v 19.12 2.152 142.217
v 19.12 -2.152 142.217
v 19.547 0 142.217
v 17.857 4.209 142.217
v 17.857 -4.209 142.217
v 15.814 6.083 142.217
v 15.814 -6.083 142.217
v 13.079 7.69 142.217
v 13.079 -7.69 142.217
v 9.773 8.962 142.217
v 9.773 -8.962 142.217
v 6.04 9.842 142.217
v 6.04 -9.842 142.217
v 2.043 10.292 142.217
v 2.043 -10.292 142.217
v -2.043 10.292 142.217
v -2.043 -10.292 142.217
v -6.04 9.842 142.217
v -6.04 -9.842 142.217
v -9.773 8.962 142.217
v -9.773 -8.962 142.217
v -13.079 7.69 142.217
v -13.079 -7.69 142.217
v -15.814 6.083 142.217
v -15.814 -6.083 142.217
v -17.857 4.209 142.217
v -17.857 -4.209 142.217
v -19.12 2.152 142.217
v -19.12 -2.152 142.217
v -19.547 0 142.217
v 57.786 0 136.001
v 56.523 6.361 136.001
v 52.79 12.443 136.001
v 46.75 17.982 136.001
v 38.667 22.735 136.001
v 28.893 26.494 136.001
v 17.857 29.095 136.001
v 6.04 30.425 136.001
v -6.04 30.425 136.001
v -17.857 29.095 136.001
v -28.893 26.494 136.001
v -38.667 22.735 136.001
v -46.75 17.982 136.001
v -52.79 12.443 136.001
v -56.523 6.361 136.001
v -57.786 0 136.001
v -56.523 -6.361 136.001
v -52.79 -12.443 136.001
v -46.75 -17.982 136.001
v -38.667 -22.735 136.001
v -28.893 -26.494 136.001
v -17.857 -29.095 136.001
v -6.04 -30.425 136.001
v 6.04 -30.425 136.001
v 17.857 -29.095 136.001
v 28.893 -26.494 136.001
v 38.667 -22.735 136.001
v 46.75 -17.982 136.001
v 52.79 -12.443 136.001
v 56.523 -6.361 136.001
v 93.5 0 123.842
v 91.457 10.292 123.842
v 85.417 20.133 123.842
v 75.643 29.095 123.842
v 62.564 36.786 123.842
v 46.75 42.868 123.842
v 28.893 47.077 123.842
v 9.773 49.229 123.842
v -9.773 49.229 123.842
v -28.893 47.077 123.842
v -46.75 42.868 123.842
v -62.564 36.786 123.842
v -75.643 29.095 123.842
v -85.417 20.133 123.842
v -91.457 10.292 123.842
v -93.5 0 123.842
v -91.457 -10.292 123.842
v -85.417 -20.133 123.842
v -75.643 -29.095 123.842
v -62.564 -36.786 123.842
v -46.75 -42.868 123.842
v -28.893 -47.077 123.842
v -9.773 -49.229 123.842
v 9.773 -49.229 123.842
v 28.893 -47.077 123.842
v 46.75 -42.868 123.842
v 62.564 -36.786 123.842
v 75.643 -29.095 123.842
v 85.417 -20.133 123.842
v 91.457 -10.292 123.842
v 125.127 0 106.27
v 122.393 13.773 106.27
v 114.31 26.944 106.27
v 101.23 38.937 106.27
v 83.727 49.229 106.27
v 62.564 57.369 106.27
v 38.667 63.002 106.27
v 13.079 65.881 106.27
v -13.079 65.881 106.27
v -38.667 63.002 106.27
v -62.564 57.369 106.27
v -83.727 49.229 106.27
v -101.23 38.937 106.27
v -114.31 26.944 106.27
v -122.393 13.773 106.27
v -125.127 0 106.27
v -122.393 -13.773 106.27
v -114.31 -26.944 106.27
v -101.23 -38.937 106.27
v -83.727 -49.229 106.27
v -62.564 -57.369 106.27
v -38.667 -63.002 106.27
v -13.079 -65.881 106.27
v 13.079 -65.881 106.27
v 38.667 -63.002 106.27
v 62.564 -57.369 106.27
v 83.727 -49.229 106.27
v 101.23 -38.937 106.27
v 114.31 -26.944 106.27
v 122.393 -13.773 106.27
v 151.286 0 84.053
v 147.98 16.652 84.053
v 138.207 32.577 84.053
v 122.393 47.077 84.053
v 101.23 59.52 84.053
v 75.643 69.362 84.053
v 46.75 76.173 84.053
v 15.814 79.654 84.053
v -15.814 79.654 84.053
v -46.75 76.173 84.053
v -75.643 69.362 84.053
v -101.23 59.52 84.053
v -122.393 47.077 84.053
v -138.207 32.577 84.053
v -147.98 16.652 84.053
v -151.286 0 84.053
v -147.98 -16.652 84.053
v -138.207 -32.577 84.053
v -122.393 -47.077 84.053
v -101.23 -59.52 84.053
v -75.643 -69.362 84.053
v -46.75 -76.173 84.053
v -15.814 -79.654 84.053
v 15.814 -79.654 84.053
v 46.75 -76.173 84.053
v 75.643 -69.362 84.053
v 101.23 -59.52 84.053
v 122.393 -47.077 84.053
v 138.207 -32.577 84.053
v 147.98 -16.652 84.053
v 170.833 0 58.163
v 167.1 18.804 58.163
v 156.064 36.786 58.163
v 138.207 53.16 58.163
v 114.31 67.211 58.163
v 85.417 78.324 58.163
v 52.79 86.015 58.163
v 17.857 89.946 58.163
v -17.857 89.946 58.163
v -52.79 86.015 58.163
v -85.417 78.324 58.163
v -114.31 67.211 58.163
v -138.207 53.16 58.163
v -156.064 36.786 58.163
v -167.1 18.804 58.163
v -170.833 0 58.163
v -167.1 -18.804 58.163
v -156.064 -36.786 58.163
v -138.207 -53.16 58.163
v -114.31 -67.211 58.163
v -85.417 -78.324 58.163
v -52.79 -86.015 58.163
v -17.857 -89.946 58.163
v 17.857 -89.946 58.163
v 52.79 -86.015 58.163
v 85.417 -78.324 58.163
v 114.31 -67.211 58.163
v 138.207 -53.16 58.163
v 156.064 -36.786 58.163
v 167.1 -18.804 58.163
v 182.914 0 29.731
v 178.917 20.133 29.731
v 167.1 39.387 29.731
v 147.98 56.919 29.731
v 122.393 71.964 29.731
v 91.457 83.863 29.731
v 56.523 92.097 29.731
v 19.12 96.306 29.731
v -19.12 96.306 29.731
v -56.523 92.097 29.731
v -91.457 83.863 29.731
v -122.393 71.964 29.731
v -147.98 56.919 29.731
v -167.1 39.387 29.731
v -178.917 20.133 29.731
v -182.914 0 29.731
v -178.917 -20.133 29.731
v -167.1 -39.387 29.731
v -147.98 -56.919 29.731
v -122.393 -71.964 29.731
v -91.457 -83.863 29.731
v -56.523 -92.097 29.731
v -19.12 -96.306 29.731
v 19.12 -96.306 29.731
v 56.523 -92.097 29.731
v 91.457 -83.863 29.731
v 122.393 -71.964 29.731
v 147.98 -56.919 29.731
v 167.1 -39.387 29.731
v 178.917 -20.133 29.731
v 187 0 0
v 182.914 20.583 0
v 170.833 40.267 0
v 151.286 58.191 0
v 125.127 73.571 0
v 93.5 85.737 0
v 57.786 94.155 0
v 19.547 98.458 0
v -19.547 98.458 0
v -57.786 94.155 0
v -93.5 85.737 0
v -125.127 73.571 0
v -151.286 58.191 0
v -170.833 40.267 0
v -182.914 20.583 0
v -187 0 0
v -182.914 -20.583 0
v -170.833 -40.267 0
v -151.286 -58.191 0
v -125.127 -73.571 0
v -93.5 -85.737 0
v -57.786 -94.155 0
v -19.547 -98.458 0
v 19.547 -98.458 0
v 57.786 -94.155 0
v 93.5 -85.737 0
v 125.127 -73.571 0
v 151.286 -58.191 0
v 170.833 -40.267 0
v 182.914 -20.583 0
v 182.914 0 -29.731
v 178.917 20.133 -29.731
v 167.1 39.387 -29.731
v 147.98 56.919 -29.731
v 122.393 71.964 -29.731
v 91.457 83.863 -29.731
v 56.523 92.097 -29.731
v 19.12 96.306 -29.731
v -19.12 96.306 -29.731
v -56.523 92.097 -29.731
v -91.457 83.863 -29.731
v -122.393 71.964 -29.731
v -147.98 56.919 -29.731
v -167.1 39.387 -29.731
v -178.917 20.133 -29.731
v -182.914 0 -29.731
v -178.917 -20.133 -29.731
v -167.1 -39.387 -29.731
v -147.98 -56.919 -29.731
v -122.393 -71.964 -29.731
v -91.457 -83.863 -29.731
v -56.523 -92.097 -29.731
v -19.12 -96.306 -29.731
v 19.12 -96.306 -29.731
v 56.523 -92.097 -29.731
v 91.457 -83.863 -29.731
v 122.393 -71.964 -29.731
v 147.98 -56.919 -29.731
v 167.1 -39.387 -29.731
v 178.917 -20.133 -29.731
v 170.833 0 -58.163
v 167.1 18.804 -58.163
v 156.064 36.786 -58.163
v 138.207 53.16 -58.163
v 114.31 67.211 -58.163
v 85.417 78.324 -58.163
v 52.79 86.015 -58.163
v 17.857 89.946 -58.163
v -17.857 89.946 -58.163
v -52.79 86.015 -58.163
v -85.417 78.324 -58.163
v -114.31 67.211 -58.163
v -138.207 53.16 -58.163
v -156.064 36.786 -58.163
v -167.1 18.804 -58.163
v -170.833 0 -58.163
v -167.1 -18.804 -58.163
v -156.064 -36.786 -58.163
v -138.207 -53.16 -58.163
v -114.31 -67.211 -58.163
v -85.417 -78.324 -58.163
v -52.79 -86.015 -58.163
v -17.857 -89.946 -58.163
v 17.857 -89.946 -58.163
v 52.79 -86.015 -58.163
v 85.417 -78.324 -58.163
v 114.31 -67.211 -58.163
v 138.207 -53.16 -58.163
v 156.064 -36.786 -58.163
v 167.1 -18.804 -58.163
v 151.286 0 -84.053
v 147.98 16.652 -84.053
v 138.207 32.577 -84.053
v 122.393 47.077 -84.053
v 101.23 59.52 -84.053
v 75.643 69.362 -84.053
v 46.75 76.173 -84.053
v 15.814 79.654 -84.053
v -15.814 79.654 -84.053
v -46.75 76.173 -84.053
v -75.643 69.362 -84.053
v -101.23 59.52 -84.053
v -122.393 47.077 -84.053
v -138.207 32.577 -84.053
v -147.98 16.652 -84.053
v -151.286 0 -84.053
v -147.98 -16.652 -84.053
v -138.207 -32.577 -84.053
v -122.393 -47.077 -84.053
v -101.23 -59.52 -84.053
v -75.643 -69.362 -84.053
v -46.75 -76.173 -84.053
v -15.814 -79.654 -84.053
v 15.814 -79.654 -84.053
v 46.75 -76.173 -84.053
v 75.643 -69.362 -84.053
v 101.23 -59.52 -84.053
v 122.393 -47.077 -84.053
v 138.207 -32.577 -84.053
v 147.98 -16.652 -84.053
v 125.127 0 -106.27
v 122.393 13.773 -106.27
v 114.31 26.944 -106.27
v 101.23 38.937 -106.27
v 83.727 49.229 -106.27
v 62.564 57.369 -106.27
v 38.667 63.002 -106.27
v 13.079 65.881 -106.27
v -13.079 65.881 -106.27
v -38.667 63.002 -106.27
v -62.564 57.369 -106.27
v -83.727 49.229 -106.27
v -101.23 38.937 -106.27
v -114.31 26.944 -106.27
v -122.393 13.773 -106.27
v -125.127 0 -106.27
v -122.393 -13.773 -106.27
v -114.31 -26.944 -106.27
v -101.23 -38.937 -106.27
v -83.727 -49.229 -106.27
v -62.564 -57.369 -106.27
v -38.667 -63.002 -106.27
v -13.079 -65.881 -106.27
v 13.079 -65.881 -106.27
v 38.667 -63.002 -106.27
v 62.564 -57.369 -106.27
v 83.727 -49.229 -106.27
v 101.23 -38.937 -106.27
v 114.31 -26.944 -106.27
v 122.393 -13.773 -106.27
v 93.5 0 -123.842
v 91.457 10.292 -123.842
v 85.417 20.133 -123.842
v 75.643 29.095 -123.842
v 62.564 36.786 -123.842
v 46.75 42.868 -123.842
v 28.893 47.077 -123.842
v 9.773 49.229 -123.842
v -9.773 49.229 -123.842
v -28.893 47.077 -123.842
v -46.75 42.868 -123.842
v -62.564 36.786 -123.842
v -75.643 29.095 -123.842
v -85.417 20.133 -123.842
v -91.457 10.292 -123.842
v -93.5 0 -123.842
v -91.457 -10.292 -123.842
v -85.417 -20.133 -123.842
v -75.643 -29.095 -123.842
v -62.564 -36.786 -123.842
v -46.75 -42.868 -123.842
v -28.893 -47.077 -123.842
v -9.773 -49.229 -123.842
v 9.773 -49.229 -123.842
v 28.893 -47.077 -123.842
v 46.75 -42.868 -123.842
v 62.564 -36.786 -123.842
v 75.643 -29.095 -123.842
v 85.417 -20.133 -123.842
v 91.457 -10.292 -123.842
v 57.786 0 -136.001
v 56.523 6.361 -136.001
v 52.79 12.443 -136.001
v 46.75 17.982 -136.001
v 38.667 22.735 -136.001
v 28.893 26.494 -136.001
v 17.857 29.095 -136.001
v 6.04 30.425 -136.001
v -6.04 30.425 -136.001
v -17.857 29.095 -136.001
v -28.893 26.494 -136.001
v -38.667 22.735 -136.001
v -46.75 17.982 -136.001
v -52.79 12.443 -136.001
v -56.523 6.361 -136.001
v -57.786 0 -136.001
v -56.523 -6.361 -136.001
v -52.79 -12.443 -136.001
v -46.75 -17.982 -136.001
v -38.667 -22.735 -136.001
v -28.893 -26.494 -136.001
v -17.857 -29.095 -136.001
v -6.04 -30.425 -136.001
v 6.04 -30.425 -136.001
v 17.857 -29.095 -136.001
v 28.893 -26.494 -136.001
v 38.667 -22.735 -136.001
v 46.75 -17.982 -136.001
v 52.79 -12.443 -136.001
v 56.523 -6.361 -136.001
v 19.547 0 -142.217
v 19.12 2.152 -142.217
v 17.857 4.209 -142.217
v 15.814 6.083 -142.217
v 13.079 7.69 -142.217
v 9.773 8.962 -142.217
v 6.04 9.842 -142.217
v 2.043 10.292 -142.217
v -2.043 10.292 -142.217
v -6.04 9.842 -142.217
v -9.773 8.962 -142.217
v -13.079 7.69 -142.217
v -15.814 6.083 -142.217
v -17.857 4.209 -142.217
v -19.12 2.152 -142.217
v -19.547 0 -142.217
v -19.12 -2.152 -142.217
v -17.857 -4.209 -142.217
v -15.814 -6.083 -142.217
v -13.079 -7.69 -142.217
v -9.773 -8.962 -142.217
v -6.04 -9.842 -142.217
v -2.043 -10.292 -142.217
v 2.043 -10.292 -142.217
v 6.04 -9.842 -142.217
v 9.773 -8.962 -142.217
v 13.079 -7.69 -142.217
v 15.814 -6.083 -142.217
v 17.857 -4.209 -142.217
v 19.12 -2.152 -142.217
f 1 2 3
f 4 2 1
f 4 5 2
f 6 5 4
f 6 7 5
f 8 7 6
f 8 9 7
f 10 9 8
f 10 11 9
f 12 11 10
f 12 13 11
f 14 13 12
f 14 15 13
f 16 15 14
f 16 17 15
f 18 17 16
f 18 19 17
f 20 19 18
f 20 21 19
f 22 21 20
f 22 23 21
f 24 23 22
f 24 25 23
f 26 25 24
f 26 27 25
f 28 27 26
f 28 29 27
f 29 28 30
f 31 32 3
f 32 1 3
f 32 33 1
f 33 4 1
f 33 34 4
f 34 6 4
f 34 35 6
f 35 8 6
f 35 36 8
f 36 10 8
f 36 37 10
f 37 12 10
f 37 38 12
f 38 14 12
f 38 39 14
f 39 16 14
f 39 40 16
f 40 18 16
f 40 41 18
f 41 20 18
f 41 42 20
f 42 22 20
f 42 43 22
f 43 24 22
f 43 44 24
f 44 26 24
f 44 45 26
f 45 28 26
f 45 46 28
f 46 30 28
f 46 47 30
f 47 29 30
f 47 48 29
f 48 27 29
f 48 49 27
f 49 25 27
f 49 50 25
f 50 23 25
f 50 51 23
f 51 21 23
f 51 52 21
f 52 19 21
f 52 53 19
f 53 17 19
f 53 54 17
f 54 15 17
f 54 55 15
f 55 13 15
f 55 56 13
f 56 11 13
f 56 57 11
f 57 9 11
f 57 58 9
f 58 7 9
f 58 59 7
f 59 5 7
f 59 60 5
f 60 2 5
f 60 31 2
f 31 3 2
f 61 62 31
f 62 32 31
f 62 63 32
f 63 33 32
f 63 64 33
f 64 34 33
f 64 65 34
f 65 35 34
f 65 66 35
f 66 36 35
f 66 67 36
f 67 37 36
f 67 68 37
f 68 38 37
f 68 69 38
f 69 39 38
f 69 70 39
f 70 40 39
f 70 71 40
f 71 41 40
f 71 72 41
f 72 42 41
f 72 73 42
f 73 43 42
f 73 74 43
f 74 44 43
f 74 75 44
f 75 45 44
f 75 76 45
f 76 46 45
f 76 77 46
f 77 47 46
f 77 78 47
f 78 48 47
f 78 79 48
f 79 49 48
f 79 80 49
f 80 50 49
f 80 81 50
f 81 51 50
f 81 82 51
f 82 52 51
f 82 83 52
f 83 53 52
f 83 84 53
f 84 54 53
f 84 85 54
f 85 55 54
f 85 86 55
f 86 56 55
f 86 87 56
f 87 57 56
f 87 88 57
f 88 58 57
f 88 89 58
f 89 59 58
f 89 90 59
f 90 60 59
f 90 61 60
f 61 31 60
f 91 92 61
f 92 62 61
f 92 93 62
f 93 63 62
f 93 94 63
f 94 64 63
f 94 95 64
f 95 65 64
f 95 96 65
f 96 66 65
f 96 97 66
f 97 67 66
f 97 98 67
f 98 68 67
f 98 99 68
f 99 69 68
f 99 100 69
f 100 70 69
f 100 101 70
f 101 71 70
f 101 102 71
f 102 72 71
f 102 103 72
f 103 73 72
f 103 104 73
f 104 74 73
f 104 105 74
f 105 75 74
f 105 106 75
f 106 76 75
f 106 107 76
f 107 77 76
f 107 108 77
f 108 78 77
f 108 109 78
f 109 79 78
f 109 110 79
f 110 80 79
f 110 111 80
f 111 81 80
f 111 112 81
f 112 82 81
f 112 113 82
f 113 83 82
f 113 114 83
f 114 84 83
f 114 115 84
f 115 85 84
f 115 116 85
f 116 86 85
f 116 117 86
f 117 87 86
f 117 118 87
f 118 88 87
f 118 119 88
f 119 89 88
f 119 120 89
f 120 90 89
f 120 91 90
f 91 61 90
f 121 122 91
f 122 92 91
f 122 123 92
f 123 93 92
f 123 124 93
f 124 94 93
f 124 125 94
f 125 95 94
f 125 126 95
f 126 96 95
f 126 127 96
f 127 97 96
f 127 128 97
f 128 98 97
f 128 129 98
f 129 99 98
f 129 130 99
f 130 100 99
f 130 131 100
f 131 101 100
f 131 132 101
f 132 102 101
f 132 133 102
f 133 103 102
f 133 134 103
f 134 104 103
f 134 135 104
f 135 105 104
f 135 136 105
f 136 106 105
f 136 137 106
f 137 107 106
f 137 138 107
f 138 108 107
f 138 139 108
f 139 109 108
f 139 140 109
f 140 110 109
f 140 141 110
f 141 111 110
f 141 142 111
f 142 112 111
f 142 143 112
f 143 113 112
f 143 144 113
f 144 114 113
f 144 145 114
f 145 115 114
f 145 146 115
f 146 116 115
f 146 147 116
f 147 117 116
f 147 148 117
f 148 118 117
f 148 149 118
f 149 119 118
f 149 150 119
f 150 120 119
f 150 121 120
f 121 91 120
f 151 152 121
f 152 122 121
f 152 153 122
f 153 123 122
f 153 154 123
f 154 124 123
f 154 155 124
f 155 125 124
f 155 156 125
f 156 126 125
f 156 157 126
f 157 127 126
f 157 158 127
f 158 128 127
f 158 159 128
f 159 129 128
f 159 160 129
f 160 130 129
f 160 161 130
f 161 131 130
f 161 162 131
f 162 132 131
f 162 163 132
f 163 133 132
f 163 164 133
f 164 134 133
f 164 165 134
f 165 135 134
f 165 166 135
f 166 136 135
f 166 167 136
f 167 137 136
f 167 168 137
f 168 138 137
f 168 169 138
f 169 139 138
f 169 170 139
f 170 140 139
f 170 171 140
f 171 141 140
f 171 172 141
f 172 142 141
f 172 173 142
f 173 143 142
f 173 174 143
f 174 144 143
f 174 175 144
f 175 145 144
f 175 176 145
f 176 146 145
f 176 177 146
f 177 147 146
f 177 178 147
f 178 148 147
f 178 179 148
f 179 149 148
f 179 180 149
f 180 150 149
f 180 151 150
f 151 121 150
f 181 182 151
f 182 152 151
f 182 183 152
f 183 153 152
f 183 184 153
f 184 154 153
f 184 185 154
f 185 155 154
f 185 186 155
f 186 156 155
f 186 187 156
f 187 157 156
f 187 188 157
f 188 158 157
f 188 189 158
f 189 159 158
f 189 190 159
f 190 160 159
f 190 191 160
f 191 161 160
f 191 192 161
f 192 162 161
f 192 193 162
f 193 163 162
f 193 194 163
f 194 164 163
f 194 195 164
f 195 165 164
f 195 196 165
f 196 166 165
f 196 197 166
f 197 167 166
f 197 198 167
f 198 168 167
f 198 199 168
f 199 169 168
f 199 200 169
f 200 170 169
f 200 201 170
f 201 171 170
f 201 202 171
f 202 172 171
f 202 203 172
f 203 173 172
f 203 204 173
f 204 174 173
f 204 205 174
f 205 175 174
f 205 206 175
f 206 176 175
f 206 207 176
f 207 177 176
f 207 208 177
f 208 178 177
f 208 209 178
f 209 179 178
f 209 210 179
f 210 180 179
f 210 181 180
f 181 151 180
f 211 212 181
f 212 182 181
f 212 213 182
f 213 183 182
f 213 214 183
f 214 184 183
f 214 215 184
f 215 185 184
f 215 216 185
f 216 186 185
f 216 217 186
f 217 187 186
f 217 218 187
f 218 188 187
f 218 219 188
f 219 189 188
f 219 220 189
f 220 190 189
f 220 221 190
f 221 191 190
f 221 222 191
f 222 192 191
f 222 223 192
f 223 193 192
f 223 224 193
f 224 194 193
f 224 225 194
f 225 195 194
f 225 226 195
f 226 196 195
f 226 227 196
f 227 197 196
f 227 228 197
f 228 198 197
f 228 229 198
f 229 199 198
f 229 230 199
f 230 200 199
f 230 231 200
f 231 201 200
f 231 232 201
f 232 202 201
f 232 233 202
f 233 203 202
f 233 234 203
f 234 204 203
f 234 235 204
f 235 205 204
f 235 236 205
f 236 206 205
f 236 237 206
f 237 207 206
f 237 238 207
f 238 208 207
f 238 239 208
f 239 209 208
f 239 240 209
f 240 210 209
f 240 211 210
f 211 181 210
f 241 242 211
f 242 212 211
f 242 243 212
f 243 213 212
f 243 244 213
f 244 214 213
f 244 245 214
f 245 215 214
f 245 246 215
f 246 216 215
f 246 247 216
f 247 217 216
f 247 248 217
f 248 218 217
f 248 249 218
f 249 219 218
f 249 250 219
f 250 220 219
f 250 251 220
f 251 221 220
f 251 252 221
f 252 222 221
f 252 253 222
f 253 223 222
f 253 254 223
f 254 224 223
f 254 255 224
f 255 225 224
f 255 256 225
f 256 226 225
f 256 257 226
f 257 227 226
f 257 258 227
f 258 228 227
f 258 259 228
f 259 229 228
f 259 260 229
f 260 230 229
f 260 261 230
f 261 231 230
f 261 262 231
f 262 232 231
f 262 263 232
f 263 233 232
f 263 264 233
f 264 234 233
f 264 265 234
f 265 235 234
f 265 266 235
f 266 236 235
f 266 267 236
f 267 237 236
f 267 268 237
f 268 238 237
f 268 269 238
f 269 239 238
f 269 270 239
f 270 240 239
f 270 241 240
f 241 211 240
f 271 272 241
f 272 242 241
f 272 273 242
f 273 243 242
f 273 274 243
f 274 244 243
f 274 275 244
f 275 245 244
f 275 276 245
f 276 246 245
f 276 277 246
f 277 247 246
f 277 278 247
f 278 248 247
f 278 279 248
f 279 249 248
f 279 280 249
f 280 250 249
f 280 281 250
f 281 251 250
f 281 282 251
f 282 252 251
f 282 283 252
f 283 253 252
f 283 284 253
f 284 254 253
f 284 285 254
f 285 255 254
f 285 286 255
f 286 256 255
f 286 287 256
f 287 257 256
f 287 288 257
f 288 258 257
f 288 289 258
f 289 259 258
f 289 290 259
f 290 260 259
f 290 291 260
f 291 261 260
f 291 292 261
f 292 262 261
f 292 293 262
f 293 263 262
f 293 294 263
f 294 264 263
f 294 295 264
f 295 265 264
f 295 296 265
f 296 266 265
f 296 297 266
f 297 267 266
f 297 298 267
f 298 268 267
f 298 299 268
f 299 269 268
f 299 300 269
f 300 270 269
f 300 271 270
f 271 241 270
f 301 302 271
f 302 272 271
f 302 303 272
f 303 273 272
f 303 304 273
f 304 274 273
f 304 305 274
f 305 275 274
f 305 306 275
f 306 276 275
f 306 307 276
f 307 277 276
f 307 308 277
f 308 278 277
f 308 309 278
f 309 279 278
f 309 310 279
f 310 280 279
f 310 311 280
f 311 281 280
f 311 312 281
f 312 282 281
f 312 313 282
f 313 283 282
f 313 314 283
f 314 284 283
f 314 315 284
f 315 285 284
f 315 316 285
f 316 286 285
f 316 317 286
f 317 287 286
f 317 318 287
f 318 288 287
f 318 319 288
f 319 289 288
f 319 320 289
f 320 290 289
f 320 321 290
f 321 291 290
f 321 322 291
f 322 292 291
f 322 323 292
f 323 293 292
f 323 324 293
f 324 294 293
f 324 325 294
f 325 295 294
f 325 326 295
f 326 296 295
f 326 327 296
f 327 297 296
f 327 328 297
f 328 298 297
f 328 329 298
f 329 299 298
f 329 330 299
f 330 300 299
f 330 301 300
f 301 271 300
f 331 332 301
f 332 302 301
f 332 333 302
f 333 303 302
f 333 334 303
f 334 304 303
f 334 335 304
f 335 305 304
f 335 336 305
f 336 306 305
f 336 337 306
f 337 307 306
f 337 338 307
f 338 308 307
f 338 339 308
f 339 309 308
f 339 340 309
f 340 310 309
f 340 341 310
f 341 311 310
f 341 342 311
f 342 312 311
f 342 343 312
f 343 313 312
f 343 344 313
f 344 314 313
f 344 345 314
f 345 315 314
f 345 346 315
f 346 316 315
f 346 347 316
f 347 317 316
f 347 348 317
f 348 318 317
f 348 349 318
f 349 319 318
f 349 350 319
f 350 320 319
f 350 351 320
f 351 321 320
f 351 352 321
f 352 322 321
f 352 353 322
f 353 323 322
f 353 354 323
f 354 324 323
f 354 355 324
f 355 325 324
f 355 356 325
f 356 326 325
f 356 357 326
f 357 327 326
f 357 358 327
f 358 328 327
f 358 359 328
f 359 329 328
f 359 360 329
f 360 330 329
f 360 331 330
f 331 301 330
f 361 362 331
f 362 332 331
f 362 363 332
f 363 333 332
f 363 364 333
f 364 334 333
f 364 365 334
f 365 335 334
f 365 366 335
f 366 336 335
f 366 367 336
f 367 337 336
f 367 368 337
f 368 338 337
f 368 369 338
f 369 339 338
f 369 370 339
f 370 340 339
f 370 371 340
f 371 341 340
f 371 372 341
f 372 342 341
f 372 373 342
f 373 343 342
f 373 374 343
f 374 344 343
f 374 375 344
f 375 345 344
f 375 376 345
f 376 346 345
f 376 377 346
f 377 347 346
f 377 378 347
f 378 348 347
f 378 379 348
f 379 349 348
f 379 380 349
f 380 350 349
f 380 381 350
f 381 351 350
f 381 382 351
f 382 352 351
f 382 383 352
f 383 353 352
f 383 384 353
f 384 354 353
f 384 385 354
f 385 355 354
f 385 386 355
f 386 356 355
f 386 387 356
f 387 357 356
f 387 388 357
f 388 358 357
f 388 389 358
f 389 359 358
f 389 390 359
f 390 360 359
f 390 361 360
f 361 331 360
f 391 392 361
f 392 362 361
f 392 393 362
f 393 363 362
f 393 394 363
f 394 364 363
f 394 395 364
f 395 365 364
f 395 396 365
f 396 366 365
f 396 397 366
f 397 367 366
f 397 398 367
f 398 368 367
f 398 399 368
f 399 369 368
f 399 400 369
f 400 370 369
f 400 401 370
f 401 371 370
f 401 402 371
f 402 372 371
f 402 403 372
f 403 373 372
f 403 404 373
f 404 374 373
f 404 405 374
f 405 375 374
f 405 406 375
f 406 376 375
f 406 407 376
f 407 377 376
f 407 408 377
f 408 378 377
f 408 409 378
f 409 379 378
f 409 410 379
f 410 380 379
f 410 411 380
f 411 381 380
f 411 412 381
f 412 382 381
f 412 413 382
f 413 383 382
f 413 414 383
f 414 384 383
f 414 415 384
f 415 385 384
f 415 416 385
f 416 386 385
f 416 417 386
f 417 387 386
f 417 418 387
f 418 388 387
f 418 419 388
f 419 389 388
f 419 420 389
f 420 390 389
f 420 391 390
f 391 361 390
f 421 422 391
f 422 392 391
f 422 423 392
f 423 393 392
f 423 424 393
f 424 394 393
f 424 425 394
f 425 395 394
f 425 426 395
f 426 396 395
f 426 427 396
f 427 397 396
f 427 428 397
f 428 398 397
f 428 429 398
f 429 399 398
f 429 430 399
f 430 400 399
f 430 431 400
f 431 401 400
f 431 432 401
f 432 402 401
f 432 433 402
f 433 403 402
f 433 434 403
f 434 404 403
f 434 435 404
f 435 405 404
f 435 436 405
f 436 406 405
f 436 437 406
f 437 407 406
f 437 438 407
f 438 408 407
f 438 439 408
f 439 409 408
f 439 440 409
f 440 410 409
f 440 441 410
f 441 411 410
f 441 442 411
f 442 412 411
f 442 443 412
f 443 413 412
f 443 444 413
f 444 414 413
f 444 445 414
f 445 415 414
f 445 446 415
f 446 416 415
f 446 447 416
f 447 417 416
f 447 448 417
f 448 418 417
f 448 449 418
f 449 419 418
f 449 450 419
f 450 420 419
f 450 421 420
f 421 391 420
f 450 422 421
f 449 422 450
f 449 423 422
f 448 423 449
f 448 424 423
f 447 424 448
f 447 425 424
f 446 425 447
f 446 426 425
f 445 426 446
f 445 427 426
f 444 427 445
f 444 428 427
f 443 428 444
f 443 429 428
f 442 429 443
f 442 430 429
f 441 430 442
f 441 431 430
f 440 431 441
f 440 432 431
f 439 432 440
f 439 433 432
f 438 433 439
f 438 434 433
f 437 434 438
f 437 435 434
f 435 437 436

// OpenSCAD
// Generated by SolidPython 1.0.1 on 2020-07-29 00:46:53


scale(v = [17, 9, 13]) {
	sphere(r = 11);
}
/***********************************************
*********      SolidPython code:      **********
************************************************
 
# import packages: SolidPython
from solid import *
from solid.utils import *
from itertools import chain, combinations, permutations


class Resize:

    def __init__(self, scad_file):
        self.scad_file = scad_file
        #self.scad_file = import_scad(scad_file)
        # cone/cylinder param:
        self.r1 = 0
        self.r2 = 0
        self.h = 0
        # rectangular prism param:
        self.w = 0
        self.l = 0
        # ellipse param:
        self.r = 0

    # import OpenScad code (file name corresponds to shape)


    # classify shape + parameters
    def assign(self, param1, param2, param3):
        if self.scad_file == 'cone.scad':
            self.r1 = param1
            self.r2 = param2
            self.h = param3
        elif self.scad_file == 'cylinder.scad':
            self.r1 = param1
            self.r2 = param2
            self.h = param3
        elif self.scad_file == 'rectangularPrism.scad':
            self.h = param1
            self.l = param2
            self.w = param3
        else:
            self.r = param1
            self.h = param2

    # resize parameters
    def iterate(self):
        x = range(3, 20, 2)
        i = 1
        if self.scad_file == 'cone.scad':
            tempList = list(permutations(x, 2))
            for temp in tempList:
                param1 = temp[0]
                param2 = temp[1]
                filepath = 'produced_scad_files/' + 'cone' + str(param1) + '_' + str(param2) + '_' + '.scad'
                scad_render_to_file(cylinder(h=param1, r1=param2, r2=0), filepath)

        elif self.scad_file == 'cylinder.scad':
            tempList = list(permutations(x, 3))
            for temp in tempList:
                param1 = temp[0]
                param2 = temp[1]
                filepath = 'produced_scad_files/' + 'cylinder' + str(param1) + '_' + str(param2) + '_' + '.scad'
                scad_render_to_file(cylinder(h=param1, r1=param2, r2=param2), filepath)

        elif self.scad_file == 'rectangularPrism.scad':
            tempList = list(permutations(x, 3))
            for temp in tempList:
                param1 = temp[0]
                param2 = temp[1]
                param3 = temp[2]
                filepath = 'produced_scad_files/' + 'rectangularPrism' + str(param1) + '_' + str(param2) + '_' + str(
                    param3) + '.scad'
                scad_render_to_file(cube(size=(param1, param2, param3)), filepath)

        elif self.scad_file == 'ellipse.scad':
            tempList = list(permutations(x, 4))
            for temp in tempList:
                param1 = temp[0]
                param2 = temp[1]
                param3 = temp[2]
                param4 = temp[3]
                filepath = 'produced_scad_files/' + 'ellipse' + str(param1) + '_' + str(param2) + '_' + str(param3) + '_' + str(param4) + '.scad'
                scad_render_to_file(scale([param1, param2, param3])(sphere(r=param4)), filepath)

    def render_to_scadfile(self):
        scad_render_to_file(scad, 'example.scad') 
 
************************************************/
